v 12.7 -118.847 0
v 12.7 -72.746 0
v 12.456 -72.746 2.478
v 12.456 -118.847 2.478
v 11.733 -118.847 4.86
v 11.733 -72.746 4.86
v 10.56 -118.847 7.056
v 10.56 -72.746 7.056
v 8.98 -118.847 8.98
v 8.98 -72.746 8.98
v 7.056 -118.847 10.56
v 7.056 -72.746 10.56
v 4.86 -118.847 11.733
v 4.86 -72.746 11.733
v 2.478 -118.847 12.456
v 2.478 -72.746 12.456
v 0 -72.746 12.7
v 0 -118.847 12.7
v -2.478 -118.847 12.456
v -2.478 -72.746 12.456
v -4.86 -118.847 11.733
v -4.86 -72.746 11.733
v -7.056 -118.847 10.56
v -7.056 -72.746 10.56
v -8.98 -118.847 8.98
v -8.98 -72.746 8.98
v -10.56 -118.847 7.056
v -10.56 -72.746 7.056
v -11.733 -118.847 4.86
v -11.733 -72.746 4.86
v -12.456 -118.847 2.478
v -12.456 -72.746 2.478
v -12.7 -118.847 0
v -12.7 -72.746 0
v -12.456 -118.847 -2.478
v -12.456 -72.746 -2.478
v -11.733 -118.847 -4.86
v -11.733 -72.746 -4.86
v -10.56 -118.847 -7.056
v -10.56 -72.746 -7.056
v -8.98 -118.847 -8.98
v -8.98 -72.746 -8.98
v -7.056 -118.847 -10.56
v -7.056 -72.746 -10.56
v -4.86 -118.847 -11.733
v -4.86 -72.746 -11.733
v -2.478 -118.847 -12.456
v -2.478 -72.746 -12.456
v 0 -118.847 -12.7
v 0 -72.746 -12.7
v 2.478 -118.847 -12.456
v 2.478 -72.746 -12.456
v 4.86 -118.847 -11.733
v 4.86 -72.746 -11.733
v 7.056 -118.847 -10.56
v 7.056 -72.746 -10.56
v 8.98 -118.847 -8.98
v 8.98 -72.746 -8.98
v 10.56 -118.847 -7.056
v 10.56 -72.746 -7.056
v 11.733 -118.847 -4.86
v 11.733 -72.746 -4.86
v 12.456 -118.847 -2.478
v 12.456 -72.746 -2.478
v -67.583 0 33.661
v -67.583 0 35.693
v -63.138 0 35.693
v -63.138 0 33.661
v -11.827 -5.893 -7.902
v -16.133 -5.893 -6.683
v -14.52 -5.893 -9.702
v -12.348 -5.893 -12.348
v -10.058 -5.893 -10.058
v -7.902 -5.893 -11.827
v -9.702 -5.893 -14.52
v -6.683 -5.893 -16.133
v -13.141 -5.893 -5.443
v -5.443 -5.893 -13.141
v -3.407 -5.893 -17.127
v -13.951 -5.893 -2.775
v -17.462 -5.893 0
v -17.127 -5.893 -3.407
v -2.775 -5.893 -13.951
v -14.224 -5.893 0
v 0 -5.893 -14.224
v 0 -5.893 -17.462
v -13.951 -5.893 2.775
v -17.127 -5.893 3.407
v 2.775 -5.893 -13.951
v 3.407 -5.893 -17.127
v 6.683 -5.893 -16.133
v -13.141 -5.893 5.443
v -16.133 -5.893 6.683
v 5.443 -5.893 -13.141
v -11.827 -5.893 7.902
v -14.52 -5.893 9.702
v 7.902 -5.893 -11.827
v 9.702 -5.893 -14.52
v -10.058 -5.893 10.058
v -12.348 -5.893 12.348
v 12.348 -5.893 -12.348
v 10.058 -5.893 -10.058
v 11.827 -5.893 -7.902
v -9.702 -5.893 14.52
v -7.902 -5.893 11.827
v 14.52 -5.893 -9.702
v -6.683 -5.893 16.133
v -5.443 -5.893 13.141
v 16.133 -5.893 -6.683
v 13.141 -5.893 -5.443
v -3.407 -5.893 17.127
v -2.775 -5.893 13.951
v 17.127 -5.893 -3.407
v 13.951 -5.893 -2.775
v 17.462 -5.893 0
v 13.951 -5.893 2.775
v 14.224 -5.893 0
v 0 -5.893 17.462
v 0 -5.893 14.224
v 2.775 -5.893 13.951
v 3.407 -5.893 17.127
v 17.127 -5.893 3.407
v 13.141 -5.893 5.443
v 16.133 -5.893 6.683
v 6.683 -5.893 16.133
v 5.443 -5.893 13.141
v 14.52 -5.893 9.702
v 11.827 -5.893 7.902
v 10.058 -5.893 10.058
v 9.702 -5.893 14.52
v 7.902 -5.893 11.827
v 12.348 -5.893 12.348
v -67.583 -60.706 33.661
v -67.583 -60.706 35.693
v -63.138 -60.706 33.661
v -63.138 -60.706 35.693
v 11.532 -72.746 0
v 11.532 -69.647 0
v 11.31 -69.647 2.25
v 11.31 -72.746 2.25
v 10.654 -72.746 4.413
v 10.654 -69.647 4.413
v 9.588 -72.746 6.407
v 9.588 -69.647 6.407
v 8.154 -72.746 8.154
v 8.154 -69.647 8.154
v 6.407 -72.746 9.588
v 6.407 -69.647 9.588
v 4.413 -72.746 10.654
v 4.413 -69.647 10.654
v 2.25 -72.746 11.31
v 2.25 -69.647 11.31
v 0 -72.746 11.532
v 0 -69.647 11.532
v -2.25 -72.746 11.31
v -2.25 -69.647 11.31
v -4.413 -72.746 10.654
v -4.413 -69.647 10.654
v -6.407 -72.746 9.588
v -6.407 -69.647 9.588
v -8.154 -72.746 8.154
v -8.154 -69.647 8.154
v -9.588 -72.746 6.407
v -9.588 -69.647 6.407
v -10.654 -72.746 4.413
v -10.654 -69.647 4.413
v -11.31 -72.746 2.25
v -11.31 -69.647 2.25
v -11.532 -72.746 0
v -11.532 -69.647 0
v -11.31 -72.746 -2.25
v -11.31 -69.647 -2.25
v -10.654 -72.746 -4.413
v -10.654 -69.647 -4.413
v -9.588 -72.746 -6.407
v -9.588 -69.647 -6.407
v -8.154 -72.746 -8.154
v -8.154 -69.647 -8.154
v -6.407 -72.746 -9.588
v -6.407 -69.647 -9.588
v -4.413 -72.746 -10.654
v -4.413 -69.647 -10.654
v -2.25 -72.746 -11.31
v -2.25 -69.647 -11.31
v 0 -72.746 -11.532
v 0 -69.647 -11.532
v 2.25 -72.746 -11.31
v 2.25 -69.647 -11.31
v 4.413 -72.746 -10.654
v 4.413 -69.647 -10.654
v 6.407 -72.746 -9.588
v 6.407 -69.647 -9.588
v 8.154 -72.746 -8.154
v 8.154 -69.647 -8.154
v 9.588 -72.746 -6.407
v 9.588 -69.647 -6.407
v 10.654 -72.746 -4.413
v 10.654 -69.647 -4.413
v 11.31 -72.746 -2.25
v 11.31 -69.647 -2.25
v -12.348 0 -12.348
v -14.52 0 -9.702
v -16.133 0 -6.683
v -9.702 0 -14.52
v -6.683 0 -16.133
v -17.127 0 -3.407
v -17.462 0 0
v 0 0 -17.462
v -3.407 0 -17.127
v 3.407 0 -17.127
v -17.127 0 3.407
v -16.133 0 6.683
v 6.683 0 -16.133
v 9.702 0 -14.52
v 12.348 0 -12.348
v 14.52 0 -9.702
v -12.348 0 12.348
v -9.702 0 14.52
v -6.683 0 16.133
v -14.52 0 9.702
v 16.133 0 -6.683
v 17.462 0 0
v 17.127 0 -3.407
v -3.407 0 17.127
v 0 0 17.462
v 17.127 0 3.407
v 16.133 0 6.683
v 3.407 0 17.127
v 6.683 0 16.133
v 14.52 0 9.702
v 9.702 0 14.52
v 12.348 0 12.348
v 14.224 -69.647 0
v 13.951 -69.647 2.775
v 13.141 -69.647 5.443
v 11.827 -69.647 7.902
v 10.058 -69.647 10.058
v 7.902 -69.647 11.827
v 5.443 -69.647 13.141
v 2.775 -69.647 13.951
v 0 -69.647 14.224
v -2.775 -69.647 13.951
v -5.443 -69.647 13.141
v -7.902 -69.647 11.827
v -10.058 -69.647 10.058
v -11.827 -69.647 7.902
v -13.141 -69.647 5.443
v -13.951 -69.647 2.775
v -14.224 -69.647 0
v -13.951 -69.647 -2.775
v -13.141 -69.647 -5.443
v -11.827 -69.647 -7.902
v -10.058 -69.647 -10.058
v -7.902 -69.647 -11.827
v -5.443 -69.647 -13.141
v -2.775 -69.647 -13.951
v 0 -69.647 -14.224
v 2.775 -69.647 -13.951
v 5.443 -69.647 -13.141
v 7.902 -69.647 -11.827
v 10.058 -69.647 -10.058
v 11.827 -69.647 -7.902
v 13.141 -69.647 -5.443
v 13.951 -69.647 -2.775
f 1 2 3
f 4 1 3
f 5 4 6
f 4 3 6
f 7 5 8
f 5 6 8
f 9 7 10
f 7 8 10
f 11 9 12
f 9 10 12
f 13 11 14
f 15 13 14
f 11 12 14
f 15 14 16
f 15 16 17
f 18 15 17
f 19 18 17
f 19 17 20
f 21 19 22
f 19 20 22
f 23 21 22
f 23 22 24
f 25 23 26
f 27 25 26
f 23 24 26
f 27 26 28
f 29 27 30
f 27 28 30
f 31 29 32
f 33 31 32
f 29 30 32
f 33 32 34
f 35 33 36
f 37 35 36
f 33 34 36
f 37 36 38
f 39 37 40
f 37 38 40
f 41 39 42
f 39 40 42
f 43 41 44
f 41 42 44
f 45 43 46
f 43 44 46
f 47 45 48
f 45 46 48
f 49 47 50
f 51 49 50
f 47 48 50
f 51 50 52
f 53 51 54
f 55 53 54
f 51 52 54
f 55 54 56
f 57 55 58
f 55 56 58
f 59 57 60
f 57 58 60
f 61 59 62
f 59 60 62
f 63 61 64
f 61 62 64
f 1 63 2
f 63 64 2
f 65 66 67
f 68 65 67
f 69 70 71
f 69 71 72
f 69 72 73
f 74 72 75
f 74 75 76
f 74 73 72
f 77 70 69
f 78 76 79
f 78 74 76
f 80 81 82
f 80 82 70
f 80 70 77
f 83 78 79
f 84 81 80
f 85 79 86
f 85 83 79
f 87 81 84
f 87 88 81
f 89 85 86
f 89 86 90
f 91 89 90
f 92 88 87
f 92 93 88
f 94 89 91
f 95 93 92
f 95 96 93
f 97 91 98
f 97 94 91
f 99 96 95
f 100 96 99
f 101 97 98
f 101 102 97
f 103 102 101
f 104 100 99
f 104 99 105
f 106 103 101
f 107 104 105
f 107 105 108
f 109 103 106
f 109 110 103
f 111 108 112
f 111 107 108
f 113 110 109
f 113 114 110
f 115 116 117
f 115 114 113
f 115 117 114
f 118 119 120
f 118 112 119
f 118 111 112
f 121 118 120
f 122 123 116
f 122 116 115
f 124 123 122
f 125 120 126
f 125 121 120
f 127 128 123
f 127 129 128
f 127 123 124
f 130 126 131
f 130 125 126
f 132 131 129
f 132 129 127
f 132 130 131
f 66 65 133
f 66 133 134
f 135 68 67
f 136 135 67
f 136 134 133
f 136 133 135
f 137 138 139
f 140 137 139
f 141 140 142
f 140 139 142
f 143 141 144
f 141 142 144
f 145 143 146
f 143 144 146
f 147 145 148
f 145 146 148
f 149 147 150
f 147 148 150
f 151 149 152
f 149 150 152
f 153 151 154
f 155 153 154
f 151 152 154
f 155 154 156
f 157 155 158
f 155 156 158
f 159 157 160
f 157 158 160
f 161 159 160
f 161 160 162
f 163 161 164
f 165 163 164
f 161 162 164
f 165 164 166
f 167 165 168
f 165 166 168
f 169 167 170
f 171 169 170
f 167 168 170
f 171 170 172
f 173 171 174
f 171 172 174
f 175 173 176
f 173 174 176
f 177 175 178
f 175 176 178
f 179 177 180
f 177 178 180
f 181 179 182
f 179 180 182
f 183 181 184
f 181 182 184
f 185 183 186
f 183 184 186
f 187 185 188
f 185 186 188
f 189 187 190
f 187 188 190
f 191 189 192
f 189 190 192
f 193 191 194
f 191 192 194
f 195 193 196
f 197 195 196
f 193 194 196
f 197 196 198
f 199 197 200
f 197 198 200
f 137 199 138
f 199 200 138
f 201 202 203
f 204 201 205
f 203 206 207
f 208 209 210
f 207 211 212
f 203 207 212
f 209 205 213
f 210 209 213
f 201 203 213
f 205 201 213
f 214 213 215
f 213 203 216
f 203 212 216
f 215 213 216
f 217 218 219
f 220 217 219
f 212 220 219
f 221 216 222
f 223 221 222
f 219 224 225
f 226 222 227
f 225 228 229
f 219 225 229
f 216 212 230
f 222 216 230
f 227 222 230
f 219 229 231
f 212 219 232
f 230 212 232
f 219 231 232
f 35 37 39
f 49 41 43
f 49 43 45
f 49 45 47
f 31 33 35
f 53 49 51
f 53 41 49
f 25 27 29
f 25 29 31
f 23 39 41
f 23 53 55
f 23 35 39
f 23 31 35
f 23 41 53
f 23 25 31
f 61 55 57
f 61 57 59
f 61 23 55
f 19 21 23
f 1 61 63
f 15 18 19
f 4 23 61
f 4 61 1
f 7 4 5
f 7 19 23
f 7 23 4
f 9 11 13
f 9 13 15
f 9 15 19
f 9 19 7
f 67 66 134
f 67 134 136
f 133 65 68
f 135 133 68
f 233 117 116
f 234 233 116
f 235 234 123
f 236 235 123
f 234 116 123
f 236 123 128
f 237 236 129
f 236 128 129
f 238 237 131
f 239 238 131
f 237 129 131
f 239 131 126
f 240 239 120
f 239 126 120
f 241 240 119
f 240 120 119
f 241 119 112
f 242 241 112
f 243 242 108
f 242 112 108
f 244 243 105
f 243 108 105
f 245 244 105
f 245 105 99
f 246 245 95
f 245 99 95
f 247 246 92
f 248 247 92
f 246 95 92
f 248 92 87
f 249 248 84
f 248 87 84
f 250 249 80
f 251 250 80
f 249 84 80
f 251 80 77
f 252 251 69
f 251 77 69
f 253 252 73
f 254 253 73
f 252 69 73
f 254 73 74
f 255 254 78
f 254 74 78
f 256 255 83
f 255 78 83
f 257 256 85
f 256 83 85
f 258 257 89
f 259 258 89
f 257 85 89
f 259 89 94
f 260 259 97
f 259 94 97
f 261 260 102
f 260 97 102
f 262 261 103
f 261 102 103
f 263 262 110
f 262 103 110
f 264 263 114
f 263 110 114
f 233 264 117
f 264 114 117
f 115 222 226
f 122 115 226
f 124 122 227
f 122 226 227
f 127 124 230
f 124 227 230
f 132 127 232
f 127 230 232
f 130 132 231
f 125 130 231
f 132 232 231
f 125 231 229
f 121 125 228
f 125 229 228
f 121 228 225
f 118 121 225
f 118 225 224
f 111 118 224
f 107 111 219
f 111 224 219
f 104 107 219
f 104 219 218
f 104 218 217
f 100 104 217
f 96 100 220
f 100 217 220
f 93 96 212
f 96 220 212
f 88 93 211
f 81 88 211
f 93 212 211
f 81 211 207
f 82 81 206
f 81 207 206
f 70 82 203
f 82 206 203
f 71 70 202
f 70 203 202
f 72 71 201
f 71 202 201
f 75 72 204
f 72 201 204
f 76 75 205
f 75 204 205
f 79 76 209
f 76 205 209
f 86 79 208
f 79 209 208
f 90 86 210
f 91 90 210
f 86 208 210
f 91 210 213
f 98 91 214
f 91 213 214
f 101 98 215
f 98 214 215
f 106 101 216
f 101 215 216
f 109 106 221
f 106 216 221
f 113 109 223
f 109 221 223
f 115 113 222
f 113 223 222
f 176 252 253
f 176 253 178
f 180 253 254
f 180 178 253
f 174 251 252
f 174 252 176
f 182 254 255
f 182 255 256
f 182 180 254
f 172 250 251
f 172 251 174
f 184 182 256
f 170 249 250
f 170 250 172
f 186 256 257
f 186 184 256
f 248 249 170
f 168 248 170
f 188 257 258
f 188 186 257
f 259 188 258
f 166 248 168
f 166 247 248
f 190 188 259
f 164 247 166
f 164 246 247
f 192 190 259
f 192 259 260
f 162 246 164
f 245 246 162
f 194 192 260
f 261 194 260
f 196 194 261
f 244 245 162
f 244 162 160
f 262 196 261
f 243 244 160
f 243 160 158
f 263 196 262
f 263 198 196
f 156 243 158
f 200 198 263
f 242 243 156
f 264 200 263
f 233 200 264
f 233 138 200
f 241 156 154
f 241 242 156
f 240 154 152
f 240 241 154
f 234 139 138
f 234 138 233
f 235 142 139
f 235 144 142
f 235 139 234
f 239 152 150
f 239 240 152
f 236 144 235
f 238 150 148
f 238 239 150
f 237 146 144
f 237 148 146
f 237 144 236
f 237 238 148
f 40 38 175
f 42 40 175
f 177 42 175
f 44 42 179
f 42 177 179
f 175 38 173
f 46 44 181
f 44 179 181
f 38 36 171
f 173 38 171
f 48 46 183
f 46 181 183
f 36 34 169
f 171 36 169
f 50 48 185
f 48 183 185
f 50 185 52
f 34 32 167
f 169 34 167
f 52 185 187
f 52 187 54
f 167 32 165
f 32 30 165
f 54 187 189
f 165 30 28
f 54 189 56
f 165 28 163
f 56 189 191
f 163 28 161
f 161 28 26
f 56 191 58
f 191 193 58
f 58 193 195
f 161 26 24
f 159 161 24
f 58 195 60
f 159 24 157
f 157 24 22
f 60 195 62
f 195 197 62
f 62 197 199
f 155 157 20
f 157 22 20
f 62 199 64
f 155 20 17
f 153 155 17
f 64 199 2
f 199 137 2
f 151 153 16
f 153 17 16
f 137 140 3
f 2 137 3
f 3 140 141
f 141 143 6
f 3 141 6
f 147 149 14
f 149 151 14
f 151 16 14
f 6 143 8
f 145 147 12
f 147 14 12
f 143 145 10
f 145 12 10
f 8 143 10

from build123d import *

# Parameters (mm, degrees)
F0_R     = 17.4625
F1_DEPTH = 5.8928
F2_R     = 14.224
F3_DEPTH = 63.754
F4_R     = 11.5316
F5_DEPTH = 3.0988
F6_R     = 12.7
F7_DEPTH = 46.101
F8_W     = 4.445
F8_H     = 2.032
F9_DEPTH = 60.706


with BuildPart() as f1:
    # F0 (on Front) → F1 (new body)
    with BuildSketch(Plane.XZ):
        Circle(F0_R)
    extrude(amount=F1_DEPTH)

    # F2 (on face) → F3 (join)
    with BuildSketch(Plane.XZ.offset(5.8928)):
        Circle(F2_R)
    extrude(amount=F3_DEPTH)

    # F4 (on face) → F5 (join)
    with BuildSketch(Plane.XZ.offset(69.6468)):
        Circle(F4_R)
    extrude(amount=F5_DEPTH)

    # F6 (on face) → F7 (join)
    with BuildSketch(Plane.XZ.offset(72.7456)):
        Circle(F6_R)
    extrude(amount=F7_DEPTH)


with BuildPart() as f9:
    # F8 (on Front) → F9 (new body)
    with BuildSketch(Plane.XZ):
        with Locations((-65.360592, 34.677008)):
            Rectangle(F8_W, F8_H)
    extrude(amount=F9_DEPTH)


solid = Compound([f1.part, f9.part])
